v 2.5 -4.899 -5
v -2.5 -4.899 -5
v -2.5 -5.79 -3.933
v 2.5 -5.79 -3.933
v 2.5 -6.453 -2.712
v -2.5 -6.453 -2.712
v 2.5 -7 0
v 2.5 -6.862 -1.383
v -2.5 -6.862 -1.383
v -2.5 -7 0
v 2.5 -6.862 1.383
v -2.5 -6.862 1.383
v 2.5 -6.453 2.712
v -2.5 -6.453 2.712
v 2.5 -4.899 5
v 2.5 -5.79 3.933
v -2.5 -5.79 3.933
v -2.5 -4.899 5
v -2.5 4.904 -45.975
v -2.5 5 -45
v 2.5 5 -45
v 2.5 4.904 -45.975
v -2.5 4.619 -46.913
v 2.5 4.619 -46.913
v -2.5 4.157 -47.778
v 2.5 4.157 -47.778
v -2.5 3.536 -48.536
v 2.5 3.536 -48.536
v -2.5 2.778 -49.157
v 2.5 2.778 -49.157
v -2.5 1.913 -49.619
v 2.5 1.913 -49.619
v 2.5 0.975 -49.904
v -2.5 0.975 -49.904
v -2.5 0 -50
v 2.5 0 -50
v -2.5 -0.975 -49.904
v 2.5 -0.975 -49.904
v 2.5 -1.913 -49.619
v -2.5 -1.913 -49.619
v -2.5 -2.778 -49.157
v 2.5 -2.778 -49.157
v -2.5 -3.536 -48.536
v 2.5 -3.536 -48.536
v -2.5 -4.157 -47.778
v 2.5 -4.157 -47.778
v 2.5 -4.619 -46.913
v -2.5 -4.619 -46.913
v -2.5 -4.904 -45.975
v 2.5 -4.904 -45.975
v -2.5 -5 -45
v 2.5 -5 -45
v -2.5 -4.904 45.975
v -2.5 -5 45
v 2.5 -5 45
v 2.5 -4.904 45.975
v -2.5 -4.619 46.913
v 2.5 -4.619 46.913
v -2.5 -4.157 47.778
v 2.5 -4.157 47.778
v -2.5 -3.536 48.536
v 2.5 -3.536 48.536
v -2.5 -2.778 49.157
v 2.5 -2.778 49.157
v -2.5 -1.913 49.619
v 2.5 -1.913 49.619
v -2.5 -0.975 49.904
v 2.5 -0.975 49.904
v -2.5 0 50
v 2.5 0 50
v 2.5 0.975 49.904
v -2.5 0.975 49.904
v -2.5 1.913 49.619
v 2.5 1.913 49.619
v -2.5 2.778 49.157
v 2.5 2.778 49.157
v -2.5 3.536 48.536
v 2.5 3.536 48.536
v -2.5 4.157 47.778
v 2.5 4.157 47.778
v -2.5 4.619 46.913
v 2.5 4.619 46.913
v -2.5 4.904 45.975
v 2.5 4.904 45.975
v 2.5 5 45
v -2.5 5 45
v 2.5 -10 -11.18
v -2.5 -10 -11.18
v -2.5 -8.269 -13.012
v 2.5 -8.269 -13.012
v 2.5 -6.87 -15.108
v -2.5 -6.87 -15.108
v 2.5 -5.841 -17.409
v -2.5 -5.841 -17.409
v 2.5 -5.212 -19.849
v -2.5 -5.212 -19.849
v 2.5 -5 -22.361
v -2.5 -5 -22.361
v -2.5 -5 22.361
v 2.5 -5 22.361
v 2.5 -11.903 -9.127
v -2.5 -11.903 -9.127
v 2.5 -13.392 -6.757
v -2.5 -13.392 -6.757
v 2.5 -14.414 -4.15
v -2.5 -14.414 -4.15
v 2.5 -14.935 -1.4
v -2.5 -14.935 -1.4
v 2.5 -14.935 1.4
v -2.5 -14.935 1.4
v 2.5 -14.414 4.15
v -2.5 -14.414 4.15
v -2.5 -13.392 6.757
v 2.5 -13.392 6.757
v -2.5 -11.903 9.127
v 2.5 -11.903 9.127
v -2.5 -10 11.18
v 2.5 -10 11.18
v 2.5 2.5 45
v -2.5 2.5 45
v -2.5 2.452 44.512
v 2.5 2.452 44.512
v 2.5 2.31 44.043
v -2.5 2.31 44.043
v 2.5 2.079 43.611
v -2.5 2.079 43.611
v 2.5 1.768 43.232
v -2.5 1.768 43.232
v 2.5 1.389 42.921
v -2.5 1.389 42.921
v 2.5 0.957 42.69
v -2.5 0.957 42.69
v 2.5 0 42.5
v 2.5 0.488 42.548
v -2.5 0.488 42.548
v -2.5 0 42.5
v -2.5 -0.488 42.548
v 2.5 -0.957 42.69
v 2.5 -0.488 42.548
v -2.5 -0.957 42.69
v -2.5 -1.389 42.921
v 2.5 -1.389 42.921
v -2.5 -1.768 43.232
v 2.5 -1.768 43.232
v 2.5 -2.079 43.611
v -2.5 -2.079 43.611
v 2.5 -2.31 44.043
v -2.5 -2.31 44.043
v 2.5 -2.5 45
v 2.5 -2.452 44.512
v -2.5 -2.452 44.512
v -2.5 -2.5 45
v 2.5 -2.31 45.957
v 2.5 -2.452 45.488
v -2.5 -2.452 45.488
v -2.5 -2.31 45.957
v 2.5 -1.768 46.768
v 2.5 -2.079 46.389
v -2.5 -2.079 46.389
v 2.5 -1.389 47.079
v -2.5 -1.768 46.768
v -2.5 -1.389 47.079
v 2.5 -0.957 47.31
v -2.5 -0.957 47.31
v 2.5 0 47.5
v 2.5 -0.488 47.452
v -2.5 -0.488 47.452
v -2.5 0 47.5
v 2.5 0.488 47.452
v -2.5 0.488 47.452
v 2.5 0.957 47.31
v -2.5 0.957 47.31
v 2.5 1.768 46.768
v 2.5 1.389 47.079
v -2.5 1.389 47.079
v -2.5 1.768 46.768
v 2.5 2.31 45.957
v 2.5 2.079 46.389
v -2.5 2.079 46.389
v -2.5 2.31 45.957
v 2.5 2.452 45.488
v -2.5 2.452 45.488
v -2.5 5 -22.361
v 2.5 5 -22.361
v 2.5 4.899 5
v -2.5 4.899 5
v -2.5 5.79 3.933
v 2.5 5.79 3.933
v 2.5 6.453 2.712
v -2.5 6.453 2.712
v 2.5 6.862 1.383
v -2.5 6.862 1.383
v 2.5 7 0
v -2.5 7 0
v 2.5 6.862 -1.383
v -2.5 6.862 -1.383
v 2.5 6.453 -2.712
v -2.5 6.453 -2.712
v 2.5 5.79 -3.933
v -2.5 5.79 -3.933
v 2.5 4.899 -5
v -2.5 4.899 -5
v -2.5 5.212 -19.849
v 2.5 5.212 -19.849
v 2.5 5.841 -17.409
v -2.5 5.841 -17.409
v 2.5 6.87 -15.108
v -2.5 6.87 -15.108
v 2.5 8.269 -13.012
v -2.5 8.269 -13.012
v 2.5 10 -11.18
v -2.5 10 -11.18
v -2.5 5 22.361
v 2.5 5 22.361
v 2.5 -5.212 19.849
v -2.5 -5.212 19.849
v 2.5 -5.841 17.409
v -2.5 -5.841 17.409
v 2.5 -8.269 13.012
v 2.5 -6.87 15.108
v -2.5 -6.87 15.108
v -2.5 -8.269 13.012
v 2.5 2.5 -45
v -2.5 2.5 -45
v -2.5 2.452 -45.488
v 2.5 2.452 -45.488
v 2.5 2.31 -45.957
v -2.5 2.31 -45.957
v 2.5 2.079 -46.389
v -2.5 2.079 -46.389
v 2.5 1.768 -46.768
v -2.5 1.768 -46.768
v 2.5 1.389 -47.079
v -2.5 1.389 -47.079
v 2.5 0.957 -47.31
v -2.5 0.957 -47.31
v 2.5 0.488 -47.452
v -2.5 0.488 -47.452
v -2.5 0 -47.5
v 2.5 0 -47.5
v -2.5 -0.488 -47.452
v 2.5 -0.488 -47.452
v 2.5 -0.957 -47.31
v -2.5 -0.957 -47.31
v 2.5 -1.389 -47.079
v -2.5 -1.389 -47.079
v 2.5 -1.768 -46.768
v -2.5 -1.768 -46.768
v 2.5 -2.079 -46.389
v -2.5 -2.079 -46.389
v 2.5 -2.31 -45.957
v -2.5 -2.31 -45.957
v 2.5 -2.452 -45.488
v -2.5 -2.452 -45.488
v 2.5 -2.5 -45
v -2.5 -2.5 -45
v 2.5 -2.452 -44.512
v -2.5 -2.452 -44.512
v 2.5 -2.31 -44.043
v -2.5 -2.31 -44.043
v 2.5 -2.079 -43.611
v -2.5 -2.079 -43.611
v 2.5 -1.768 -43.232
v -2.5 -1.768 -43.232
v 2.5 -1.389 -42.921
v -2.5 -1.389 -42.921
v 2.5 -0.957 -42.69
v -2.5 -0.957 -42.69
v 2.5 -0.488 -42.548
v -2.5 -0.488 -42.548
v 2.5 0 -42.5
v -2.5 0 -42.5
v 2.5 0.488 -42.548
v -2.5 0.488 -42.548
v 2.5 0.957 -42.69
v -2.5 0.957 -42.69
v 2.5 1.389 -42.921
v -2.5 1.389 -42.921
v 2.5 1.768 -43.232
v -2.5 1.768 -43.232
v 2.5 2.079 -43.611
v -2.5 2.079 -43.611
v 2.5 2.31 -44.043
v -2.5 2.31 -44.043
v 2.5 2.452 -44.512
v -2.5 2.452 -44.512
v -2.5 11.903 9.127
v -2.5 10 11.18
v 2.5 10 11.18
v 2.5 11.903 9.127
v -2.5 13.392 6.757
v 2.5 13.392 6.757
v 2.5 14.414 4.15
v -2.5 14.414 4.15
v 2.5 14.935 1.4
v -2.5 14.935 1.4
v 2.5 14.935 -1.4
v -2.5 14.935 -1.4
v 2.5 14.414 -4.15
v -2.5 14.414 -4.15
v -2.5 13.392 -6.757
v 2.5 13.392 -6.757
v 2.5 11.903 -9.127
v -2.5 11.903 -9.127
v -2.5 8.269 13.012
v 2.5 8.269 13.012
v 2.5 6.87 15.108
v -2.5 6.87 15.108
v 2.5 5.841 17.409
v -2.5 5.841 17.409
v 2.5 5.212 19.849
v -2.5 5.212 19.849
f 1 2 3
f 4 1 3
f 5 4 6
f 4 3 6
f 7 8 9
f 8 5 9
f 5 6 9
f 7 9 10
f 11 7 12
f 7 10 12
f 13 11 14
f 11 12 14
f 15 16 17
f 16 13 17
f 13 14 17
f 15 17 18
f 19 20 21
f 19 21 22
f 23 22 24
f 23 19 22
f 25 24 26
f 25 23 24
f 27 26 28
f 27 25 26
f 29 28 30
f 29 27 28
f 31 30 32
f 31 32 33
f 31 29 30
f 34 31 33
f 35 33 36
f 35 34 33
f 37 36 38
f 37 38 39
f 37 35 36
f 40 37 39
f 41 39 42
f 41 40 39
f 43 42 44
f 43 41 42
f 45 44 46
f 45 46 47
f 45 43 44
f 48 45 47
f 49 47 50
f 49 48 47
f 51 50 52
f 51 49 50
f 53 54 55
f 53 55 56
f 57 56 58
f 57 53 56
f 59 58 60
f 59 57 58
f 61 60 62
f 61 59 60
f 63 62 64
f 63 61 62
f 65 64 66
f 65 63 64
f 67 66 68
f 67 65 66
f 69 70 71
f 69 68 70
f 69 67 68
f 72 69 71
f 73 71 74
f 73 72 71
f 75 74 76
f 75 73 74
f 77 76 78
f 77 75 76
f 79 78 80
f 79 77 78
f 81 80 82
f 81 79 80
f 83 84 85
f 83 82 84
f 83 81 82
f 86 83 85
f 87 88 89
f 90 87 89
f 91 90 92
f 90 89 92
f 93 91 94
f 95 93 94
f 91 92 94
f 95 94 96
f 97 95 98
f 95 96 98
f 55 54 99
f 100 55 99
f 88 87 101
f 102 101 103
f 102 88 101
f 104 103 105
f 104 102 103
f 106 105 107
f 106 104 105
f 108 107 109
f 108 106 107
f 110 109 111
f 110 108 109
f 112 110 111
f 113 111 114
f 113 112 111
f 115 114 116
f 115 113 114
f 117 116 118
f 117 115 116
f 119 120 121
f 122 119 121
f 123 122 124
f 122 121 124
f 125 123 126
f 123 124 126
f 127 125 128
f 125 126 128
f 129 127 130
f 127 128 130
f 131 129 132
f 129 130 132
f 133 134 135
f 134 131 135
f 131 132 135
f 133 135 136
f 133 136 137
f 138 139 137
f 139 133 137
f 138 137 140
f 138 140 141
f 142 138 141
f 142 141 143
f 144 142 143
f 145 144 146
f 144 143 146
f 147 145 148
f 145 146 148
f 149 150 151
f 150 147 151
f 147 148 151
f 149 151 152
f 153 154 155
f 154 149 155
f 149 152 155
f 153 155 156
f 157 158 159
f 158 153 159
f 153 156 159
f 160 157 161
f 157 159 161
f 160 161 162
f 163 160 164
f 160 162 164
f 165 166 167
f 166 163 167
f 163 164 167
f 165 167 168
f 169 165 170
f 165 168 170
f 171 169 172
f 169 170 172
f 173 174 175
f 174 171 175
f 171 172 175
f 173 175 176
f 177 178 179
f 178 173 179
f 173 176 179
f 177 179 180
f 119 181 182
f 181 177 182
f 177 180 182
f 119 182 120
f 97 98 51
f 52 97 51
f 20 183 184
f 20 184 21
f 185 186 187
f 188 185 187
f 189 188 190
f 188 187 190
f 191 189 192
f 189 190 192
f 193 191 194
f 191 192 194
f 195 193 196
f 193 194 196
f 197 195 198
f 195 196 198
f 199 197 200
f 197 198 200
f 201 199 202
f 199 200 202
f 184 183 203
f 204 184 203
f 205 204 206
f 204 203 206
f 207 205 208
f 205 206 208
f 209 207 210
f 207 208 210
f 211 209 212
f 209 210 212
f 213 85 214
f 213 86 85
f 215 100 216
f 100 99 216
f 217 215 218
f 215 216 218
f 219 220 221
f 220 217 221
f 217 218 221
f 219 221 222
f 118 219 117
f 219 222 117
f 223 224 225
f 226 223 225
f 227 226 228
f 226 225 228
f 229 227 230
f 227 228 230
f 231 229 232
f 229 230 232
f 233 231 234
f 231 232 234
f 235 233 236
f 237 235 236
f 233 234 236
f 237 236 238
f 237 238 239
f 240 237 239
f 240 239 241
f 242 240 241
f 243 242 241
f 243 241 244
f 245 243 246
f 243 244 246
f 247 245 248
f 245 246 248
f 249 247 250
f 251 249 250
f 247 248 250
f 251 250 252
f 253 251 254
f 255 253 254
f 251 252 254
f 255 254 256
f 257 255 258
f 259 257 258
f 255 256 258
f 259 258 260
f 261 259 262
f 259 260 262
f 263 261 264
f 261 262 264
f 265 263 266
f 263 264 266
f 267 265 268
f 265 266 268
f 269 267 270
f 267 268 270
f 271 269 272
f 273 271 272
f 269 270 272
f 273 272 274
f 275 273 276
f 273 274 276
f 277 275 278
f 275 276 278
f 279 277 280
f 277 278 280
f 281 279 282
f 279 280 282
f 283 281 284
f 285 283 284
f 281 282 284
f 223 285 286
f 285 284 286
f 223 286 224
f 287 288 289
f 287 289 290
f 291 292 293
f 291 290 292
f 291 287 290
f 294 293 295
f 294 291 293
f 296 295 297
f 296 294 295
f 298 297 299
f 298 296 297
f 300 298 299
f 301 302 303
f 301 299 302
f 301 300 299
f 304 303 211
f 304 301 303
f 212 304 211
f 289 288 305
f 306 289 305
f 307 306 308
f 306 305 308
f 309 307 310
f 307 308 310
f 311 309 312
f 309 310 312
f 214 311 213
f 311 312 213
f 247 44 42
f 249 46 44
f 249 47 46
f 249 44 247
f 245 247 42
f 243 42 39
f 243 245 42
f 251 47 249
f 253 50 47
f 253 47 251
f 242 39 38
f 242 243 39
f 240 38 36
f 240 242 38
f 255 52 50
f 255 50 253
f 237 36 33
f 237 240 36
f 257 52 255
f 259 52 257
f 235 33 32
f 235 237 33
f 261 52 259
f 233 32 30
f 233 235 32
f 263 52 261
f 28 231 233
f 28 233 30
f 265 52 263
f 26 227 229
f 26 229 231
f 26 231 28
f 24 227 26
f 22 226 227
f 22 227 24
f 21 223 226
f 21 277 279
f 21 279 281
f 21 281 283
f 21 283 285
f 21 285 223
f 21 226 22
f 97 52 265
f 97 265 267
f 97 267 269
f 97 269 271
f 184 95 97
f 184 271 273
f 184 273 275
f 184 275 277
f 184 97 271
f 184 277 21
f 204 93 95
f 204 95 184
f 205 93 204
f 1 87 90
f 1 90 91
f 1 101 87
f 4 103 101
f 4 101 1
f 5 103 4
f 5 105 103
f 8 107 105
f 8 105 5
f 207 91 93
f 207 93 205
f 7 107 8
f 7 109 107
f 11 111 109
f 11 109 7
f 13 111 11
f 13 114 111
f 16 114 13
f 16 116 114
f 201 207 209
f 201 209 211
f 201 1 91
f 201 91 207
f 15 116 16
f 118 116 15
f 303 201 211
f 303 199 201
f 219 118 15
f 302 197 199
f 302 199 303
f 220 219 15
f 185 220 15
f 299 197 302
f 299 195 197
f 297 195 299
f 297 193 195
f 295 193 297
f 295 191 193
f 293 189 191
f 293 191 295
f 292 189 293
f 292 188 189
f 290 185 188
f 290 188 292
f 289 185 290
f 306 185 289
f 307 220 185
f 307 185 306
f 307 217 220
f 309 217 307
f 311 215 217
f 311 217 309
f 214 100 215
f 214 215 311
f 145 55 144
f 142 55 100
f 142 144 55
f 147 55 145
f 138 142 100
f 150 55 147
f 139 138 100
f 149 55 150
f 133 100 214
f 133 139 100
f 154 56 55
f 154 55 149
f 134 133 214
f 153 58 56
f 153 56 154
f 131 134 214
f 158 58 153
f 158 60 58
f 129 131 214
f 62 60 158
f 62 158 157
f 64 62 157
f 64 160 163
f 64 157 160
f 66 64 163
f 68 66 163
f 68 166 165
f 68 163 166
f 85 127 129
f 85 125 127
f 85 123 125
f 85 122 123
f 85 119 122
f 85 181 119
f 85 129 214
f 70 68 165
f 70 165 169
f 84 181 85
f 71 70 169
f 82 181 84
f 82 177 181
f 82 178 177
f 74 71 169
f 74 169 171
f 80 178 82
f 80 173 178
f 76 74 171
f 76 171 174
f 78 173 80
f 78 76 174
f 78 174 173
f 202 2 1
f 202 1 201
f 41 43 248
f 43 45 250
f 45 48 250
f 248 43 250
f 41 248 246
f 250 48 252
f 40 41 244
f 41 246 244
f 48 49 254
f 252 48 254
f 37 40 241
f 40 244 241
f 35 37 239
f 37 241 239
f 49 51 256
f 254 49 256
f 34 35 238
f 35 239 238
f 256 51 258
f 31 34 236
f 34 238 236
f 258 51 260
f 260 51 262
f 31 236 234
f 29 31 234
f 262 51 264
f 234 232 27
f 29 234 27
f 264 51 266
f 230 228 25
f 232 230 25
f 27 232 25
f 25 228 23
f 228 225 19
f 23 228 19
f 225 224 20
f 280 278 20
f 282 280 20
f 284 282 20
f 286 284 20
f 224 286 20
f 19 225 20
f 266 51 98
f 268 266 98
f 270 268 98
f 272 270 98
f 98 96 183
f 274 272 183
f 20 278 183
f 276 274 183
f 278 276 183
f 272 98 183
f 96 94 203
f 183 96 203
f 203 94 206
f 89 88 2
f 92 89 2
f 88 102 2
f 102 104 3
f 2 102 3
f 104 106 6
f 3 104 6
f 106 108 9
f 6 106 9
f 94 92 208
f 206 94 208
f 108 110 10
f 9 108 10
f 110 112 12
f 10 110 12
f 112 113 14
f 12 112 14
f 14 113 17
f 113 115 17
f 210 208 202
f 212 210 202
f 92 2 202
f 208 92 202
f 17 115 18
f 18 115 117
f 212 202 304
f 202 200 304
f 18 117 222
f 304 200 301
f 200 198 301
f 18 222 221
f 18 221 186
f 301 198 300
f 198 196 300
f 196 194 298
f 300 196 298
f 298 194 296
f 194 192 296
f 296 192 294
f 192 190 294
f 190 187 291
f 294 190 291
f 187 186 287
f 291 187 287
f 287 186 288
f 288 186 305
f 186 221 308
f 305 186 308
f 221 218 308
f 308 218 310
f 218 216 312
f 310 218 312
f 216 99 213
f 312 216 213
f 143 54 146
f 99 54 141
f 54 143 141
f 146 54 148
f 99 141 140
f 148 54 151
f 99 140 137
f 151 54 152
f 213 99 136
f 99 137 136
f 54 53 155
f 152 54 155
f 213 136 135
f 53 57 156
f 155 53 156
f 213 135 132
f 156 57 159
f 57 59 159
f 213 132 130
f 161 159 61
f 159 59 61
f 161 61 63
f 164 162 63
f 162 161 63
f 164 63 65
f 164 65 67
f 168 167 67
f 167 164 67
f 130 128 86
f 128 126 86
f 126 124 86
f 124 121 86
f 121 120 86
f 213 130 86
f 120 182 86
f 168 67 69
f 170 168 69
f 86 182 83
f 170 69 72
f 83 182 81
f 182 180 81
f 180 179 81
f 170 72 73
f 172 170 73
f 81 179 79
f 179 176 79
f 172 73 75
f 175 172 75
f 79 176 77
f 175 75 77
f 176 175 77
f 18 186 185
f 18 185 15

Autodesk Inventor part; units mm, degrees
ref_plane "YZ Plane" through (0, 0, 0) normal (1, 0, 0) x (0, 1, 0)
ref_plane "XZ Plane" through (0, 0, 0) normal (0, 1, 0) x (-1, 0, 0)
ref_plane "XY Plane" through (0, 0, 0) normal (0, 0, 1) x (1, 0, 0)
sketch "Sketch4" plane through (0, 0, 0) normal (1, 0, 0) x (0, 1, 0)
  circle A0 centre (0, 0) radius 7
  line L0 (4.899, 5) -> (-4.899, 5)
  line L1 (-4.899, -5) -> (4.899, -5)
  circle A1 centre (0, 0) radius 15
  circle A2 centre (0, 45) radius 2.5
  circle A3 centre (0, 45) radius 5
  line L2 (5, 45) -> (5, 22.3607)
  line L3 (-5, 45) -> (-5, 22.3607)
  line L4 (0, 0) -> (0, 45) construction
  arc A4 (5, 22.3607) -> (10, 11.1803) centre (20, 22.3607) ccw
  arc A5 (-10, 11.1803) -> (-5, 22.3607) centre (-20, 22.3607) ccw
  dimension "d29" = 30
  dimension "d18" = 14
  dimension "d19" = 10
  dimension "d30" = 10
  dimension "d31" = 5
  dimension "d33" = 45
extrude "Extrusion4" add sketch "Sketch4" along normal mid plane 5 contours L0 A0 | A0 L1 | A1
extrude "Extrusion5" add sketch "Sketch4" along normal mid plane 5 contours A1 A5 L3 A3 L2 A4 | A3
mirror "Mirror2" about plane through (0, 0, 0) normal (0, 0, 1) of "Extrusion5"
properties part number "panel" material "Aluminum 6061"
